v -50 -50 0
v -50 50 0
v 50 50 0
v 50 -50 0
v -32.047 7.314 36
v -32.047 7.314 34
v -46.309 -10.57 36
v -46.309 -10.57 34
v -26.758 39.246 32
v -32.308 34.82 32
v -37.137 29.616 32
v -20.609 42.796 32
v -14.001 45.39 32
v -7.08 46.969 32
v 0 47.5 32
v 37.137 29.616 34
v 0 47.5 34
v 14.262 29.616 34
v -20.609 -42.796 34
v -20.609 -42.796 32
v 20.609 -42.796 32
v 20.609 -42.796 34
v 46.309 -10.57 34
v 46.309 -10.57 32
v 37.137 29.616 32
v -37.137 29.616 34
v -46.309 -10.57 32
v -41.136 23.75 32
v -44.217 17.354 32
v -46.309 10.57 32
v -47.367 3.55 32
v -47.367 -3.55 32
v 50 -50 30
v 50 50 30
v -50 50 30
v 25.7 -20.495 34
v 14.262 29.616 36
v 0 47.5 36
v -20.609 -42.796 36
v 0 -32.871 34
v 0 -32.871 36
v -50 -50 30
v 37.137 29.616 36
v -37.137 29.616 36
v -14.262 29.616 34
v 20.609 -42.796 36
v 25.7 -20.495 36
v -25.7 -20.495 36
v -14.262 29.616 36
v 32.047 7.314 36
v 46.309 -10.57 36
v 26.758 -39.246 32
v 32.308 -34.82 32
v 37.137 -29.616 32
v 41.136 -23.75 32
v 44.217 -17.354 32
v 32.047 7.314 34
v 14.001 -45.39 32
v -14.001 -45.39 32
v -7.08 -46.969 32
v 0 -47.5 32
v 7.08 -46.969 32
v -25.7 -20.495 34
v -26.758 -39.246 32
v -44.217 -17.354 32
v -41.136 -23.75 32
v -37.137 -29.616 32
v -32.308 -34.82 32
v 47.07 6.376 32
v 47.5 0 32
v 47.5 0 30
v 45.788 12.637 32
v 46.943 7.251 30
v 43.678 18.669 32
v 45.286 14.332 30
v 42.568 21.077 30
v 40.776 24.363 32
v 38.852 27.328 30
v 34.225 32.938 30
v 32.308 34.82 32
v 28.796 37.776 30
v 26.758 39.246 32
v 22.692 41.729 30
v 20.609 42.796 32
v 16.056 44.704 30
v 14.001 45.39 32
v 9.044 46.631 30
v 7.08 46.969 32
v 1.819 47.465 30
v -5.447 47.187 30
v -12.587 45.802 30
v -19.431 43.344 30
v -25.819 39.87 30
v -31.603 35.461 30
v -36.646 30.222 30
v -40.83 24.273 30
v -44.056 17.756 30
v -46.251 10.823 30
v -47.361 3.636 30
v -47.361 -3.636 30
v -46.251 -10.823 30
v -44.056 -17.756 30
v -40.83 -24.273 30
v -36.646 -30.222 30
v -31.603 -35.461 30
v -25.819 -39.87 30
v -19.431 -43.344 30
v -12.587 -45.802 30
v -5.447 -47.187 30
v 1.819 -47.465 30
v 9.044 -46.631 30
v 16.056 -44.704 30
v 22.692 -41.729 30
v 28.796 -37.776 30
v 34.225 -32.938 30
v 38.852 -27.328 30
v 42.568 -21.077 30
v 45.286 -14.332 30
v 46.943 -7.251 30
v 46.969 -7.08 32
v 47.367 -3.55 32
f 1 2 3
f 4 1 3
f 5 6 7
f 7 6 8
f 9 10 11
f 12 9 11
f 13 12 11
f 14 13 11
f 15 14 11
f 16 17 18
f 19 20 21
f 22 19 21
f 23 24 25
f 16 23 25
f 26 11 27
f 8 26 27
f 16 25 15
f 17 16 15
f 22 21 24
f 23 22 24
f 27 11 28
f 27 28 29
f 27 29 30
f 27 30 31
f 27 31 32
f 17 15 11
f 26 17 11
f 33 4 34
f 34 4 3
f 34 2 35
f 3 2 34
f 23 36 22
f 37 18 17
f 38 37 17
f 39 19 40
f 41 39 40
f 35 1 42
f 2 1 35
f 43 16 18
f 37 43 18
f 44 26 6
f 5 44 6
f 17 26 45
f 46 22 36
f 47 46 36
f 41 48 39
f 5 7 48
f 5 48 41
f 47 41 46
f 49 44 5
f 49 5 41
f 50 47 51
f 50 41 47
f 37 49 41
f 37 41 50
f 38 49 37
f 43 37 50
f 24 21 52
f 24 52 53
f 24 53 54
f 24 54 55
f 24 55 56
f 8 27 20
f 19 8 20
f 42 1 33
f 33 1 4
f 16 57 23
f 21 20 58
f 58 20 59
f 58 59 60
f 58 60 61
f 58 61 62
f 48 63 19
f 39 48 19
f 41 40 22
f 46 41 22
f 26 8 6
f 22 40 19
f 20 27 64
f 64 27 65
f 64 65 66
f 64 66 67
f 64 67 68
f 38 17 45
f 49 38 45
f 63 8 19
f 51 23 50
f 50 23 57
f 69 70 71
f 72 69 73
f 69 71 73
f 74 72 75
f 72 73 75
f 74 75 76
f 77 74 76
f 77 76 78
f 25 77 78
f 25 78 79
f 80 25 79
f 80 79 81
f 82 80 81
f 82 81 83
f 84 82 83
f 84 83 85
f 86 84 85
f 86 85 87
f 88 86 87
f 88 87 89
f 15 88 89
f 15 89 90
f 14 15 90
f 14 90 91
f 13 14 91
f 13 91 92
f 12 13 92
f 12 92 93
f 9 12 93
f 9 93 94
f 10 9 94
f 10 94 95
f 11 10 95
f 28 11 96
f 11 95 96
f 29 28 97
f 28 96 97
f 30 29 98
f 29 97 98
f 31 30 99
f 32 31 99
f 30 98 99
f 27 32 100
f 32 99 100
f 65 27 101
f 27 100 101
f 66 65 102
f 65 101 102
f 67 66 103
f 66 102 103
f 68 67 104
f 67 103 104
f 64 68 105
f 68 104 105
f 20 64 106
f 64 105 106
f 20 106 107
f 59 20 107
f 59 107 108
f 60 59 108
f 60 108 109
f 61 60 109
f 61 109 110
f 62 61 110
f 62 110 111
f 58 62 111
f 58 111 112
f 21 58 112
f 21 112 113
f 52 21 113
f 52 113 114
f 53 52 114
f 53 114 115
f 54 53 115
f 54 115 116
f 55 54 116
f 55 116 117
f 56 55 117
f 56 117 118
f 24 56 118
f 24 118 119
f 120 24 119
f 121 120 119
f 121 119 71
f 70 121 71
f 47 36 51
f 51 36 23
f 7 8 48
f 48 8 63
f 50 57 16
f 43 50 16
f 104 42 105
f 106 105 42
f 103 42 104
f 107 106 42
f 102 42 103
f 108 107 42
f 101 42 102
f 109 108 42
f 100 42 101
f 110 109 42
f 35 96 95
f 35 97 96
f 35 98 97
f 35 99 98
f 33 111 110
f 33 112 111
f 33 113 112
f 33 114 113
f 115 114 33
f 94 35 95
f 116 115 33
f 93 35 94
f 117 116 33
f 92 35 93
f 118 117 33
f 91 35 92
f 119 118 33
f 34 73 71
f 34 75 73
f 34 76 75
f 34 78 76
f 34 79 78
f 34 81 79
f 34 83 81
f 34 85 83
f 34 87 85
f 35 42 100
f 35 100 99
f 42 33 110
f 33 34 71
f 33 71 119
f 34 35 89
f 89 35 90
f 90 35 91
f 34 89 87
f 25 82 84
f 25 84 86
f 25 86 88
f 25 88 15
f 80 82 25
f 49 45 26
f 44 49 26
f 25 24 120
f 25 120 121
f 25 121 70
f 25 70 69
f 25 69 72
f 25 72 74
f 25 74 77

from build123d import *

# Parameters (mm, degrees)
F0_W     = 100
F0_H     = 100
F1_DEPTH = 30
F2_R     = 47.5
F3_DEPTH = 2
F5_DEPTH = 2
F7_DEPTH = 2


# Not quite as in the source:
# - a feature names something its author has since deleted; it is built from what else it names


with BuildPart() as f1:
    # F0 (on Top) → F1 (new body)
    with BuildSketch(Plane.XY):
        Rectangle(F0_W, F0_H)
    extrude(amount=F1_DEPTH)

    # F2 (on face) → F3 (join)
    with BuildSketch(Plane.XY.offset(30)):
        Circle(F2_R)
    extrude(amount=F3_DEPTH)

    # F4 (on face) → F5 (join)
    with BuildSketch(Plane.XY.offset(32)):
        Polygon((37.1369954172, 29.6157655883), (0, 47.5), (-37.1369954172, 29.6157655883), (-46.3090758286, -10.5697443629), (-20.6094776081, -42.7960212254), (20.6094776081, -42.7960212254), (46.3090758286, -10.5697443629), align=None)
    extrude(amount=F5_DEPTH)

    # F6 (on face) → F7 (join)
    with BuildSketch(Plane.XY.offset(34)):
        Polygon((-25.6995982206, -20.4947456859), (-20.6094776081, -42.7960212254), (0, -32.8710199024), (20.6094776081, -42.7960212254), (25.6995982206, -20.4947456859), (46.3090758286, -10.5697443629), (32.0468748048, 7.3144900488), (37.1369954172, 29.6157655883), (14.2622010239, 29.6157655883), (0, 47.5), (-14.2622010239, 29.6157655883), (-37.1369954172, 29.6157655883), (-32.0468748048, 7.3144900488), (-46.3090758286, -10.5697443629), align=None)
    extrude(amount=F7_DEPTH)


solid = f1.part
